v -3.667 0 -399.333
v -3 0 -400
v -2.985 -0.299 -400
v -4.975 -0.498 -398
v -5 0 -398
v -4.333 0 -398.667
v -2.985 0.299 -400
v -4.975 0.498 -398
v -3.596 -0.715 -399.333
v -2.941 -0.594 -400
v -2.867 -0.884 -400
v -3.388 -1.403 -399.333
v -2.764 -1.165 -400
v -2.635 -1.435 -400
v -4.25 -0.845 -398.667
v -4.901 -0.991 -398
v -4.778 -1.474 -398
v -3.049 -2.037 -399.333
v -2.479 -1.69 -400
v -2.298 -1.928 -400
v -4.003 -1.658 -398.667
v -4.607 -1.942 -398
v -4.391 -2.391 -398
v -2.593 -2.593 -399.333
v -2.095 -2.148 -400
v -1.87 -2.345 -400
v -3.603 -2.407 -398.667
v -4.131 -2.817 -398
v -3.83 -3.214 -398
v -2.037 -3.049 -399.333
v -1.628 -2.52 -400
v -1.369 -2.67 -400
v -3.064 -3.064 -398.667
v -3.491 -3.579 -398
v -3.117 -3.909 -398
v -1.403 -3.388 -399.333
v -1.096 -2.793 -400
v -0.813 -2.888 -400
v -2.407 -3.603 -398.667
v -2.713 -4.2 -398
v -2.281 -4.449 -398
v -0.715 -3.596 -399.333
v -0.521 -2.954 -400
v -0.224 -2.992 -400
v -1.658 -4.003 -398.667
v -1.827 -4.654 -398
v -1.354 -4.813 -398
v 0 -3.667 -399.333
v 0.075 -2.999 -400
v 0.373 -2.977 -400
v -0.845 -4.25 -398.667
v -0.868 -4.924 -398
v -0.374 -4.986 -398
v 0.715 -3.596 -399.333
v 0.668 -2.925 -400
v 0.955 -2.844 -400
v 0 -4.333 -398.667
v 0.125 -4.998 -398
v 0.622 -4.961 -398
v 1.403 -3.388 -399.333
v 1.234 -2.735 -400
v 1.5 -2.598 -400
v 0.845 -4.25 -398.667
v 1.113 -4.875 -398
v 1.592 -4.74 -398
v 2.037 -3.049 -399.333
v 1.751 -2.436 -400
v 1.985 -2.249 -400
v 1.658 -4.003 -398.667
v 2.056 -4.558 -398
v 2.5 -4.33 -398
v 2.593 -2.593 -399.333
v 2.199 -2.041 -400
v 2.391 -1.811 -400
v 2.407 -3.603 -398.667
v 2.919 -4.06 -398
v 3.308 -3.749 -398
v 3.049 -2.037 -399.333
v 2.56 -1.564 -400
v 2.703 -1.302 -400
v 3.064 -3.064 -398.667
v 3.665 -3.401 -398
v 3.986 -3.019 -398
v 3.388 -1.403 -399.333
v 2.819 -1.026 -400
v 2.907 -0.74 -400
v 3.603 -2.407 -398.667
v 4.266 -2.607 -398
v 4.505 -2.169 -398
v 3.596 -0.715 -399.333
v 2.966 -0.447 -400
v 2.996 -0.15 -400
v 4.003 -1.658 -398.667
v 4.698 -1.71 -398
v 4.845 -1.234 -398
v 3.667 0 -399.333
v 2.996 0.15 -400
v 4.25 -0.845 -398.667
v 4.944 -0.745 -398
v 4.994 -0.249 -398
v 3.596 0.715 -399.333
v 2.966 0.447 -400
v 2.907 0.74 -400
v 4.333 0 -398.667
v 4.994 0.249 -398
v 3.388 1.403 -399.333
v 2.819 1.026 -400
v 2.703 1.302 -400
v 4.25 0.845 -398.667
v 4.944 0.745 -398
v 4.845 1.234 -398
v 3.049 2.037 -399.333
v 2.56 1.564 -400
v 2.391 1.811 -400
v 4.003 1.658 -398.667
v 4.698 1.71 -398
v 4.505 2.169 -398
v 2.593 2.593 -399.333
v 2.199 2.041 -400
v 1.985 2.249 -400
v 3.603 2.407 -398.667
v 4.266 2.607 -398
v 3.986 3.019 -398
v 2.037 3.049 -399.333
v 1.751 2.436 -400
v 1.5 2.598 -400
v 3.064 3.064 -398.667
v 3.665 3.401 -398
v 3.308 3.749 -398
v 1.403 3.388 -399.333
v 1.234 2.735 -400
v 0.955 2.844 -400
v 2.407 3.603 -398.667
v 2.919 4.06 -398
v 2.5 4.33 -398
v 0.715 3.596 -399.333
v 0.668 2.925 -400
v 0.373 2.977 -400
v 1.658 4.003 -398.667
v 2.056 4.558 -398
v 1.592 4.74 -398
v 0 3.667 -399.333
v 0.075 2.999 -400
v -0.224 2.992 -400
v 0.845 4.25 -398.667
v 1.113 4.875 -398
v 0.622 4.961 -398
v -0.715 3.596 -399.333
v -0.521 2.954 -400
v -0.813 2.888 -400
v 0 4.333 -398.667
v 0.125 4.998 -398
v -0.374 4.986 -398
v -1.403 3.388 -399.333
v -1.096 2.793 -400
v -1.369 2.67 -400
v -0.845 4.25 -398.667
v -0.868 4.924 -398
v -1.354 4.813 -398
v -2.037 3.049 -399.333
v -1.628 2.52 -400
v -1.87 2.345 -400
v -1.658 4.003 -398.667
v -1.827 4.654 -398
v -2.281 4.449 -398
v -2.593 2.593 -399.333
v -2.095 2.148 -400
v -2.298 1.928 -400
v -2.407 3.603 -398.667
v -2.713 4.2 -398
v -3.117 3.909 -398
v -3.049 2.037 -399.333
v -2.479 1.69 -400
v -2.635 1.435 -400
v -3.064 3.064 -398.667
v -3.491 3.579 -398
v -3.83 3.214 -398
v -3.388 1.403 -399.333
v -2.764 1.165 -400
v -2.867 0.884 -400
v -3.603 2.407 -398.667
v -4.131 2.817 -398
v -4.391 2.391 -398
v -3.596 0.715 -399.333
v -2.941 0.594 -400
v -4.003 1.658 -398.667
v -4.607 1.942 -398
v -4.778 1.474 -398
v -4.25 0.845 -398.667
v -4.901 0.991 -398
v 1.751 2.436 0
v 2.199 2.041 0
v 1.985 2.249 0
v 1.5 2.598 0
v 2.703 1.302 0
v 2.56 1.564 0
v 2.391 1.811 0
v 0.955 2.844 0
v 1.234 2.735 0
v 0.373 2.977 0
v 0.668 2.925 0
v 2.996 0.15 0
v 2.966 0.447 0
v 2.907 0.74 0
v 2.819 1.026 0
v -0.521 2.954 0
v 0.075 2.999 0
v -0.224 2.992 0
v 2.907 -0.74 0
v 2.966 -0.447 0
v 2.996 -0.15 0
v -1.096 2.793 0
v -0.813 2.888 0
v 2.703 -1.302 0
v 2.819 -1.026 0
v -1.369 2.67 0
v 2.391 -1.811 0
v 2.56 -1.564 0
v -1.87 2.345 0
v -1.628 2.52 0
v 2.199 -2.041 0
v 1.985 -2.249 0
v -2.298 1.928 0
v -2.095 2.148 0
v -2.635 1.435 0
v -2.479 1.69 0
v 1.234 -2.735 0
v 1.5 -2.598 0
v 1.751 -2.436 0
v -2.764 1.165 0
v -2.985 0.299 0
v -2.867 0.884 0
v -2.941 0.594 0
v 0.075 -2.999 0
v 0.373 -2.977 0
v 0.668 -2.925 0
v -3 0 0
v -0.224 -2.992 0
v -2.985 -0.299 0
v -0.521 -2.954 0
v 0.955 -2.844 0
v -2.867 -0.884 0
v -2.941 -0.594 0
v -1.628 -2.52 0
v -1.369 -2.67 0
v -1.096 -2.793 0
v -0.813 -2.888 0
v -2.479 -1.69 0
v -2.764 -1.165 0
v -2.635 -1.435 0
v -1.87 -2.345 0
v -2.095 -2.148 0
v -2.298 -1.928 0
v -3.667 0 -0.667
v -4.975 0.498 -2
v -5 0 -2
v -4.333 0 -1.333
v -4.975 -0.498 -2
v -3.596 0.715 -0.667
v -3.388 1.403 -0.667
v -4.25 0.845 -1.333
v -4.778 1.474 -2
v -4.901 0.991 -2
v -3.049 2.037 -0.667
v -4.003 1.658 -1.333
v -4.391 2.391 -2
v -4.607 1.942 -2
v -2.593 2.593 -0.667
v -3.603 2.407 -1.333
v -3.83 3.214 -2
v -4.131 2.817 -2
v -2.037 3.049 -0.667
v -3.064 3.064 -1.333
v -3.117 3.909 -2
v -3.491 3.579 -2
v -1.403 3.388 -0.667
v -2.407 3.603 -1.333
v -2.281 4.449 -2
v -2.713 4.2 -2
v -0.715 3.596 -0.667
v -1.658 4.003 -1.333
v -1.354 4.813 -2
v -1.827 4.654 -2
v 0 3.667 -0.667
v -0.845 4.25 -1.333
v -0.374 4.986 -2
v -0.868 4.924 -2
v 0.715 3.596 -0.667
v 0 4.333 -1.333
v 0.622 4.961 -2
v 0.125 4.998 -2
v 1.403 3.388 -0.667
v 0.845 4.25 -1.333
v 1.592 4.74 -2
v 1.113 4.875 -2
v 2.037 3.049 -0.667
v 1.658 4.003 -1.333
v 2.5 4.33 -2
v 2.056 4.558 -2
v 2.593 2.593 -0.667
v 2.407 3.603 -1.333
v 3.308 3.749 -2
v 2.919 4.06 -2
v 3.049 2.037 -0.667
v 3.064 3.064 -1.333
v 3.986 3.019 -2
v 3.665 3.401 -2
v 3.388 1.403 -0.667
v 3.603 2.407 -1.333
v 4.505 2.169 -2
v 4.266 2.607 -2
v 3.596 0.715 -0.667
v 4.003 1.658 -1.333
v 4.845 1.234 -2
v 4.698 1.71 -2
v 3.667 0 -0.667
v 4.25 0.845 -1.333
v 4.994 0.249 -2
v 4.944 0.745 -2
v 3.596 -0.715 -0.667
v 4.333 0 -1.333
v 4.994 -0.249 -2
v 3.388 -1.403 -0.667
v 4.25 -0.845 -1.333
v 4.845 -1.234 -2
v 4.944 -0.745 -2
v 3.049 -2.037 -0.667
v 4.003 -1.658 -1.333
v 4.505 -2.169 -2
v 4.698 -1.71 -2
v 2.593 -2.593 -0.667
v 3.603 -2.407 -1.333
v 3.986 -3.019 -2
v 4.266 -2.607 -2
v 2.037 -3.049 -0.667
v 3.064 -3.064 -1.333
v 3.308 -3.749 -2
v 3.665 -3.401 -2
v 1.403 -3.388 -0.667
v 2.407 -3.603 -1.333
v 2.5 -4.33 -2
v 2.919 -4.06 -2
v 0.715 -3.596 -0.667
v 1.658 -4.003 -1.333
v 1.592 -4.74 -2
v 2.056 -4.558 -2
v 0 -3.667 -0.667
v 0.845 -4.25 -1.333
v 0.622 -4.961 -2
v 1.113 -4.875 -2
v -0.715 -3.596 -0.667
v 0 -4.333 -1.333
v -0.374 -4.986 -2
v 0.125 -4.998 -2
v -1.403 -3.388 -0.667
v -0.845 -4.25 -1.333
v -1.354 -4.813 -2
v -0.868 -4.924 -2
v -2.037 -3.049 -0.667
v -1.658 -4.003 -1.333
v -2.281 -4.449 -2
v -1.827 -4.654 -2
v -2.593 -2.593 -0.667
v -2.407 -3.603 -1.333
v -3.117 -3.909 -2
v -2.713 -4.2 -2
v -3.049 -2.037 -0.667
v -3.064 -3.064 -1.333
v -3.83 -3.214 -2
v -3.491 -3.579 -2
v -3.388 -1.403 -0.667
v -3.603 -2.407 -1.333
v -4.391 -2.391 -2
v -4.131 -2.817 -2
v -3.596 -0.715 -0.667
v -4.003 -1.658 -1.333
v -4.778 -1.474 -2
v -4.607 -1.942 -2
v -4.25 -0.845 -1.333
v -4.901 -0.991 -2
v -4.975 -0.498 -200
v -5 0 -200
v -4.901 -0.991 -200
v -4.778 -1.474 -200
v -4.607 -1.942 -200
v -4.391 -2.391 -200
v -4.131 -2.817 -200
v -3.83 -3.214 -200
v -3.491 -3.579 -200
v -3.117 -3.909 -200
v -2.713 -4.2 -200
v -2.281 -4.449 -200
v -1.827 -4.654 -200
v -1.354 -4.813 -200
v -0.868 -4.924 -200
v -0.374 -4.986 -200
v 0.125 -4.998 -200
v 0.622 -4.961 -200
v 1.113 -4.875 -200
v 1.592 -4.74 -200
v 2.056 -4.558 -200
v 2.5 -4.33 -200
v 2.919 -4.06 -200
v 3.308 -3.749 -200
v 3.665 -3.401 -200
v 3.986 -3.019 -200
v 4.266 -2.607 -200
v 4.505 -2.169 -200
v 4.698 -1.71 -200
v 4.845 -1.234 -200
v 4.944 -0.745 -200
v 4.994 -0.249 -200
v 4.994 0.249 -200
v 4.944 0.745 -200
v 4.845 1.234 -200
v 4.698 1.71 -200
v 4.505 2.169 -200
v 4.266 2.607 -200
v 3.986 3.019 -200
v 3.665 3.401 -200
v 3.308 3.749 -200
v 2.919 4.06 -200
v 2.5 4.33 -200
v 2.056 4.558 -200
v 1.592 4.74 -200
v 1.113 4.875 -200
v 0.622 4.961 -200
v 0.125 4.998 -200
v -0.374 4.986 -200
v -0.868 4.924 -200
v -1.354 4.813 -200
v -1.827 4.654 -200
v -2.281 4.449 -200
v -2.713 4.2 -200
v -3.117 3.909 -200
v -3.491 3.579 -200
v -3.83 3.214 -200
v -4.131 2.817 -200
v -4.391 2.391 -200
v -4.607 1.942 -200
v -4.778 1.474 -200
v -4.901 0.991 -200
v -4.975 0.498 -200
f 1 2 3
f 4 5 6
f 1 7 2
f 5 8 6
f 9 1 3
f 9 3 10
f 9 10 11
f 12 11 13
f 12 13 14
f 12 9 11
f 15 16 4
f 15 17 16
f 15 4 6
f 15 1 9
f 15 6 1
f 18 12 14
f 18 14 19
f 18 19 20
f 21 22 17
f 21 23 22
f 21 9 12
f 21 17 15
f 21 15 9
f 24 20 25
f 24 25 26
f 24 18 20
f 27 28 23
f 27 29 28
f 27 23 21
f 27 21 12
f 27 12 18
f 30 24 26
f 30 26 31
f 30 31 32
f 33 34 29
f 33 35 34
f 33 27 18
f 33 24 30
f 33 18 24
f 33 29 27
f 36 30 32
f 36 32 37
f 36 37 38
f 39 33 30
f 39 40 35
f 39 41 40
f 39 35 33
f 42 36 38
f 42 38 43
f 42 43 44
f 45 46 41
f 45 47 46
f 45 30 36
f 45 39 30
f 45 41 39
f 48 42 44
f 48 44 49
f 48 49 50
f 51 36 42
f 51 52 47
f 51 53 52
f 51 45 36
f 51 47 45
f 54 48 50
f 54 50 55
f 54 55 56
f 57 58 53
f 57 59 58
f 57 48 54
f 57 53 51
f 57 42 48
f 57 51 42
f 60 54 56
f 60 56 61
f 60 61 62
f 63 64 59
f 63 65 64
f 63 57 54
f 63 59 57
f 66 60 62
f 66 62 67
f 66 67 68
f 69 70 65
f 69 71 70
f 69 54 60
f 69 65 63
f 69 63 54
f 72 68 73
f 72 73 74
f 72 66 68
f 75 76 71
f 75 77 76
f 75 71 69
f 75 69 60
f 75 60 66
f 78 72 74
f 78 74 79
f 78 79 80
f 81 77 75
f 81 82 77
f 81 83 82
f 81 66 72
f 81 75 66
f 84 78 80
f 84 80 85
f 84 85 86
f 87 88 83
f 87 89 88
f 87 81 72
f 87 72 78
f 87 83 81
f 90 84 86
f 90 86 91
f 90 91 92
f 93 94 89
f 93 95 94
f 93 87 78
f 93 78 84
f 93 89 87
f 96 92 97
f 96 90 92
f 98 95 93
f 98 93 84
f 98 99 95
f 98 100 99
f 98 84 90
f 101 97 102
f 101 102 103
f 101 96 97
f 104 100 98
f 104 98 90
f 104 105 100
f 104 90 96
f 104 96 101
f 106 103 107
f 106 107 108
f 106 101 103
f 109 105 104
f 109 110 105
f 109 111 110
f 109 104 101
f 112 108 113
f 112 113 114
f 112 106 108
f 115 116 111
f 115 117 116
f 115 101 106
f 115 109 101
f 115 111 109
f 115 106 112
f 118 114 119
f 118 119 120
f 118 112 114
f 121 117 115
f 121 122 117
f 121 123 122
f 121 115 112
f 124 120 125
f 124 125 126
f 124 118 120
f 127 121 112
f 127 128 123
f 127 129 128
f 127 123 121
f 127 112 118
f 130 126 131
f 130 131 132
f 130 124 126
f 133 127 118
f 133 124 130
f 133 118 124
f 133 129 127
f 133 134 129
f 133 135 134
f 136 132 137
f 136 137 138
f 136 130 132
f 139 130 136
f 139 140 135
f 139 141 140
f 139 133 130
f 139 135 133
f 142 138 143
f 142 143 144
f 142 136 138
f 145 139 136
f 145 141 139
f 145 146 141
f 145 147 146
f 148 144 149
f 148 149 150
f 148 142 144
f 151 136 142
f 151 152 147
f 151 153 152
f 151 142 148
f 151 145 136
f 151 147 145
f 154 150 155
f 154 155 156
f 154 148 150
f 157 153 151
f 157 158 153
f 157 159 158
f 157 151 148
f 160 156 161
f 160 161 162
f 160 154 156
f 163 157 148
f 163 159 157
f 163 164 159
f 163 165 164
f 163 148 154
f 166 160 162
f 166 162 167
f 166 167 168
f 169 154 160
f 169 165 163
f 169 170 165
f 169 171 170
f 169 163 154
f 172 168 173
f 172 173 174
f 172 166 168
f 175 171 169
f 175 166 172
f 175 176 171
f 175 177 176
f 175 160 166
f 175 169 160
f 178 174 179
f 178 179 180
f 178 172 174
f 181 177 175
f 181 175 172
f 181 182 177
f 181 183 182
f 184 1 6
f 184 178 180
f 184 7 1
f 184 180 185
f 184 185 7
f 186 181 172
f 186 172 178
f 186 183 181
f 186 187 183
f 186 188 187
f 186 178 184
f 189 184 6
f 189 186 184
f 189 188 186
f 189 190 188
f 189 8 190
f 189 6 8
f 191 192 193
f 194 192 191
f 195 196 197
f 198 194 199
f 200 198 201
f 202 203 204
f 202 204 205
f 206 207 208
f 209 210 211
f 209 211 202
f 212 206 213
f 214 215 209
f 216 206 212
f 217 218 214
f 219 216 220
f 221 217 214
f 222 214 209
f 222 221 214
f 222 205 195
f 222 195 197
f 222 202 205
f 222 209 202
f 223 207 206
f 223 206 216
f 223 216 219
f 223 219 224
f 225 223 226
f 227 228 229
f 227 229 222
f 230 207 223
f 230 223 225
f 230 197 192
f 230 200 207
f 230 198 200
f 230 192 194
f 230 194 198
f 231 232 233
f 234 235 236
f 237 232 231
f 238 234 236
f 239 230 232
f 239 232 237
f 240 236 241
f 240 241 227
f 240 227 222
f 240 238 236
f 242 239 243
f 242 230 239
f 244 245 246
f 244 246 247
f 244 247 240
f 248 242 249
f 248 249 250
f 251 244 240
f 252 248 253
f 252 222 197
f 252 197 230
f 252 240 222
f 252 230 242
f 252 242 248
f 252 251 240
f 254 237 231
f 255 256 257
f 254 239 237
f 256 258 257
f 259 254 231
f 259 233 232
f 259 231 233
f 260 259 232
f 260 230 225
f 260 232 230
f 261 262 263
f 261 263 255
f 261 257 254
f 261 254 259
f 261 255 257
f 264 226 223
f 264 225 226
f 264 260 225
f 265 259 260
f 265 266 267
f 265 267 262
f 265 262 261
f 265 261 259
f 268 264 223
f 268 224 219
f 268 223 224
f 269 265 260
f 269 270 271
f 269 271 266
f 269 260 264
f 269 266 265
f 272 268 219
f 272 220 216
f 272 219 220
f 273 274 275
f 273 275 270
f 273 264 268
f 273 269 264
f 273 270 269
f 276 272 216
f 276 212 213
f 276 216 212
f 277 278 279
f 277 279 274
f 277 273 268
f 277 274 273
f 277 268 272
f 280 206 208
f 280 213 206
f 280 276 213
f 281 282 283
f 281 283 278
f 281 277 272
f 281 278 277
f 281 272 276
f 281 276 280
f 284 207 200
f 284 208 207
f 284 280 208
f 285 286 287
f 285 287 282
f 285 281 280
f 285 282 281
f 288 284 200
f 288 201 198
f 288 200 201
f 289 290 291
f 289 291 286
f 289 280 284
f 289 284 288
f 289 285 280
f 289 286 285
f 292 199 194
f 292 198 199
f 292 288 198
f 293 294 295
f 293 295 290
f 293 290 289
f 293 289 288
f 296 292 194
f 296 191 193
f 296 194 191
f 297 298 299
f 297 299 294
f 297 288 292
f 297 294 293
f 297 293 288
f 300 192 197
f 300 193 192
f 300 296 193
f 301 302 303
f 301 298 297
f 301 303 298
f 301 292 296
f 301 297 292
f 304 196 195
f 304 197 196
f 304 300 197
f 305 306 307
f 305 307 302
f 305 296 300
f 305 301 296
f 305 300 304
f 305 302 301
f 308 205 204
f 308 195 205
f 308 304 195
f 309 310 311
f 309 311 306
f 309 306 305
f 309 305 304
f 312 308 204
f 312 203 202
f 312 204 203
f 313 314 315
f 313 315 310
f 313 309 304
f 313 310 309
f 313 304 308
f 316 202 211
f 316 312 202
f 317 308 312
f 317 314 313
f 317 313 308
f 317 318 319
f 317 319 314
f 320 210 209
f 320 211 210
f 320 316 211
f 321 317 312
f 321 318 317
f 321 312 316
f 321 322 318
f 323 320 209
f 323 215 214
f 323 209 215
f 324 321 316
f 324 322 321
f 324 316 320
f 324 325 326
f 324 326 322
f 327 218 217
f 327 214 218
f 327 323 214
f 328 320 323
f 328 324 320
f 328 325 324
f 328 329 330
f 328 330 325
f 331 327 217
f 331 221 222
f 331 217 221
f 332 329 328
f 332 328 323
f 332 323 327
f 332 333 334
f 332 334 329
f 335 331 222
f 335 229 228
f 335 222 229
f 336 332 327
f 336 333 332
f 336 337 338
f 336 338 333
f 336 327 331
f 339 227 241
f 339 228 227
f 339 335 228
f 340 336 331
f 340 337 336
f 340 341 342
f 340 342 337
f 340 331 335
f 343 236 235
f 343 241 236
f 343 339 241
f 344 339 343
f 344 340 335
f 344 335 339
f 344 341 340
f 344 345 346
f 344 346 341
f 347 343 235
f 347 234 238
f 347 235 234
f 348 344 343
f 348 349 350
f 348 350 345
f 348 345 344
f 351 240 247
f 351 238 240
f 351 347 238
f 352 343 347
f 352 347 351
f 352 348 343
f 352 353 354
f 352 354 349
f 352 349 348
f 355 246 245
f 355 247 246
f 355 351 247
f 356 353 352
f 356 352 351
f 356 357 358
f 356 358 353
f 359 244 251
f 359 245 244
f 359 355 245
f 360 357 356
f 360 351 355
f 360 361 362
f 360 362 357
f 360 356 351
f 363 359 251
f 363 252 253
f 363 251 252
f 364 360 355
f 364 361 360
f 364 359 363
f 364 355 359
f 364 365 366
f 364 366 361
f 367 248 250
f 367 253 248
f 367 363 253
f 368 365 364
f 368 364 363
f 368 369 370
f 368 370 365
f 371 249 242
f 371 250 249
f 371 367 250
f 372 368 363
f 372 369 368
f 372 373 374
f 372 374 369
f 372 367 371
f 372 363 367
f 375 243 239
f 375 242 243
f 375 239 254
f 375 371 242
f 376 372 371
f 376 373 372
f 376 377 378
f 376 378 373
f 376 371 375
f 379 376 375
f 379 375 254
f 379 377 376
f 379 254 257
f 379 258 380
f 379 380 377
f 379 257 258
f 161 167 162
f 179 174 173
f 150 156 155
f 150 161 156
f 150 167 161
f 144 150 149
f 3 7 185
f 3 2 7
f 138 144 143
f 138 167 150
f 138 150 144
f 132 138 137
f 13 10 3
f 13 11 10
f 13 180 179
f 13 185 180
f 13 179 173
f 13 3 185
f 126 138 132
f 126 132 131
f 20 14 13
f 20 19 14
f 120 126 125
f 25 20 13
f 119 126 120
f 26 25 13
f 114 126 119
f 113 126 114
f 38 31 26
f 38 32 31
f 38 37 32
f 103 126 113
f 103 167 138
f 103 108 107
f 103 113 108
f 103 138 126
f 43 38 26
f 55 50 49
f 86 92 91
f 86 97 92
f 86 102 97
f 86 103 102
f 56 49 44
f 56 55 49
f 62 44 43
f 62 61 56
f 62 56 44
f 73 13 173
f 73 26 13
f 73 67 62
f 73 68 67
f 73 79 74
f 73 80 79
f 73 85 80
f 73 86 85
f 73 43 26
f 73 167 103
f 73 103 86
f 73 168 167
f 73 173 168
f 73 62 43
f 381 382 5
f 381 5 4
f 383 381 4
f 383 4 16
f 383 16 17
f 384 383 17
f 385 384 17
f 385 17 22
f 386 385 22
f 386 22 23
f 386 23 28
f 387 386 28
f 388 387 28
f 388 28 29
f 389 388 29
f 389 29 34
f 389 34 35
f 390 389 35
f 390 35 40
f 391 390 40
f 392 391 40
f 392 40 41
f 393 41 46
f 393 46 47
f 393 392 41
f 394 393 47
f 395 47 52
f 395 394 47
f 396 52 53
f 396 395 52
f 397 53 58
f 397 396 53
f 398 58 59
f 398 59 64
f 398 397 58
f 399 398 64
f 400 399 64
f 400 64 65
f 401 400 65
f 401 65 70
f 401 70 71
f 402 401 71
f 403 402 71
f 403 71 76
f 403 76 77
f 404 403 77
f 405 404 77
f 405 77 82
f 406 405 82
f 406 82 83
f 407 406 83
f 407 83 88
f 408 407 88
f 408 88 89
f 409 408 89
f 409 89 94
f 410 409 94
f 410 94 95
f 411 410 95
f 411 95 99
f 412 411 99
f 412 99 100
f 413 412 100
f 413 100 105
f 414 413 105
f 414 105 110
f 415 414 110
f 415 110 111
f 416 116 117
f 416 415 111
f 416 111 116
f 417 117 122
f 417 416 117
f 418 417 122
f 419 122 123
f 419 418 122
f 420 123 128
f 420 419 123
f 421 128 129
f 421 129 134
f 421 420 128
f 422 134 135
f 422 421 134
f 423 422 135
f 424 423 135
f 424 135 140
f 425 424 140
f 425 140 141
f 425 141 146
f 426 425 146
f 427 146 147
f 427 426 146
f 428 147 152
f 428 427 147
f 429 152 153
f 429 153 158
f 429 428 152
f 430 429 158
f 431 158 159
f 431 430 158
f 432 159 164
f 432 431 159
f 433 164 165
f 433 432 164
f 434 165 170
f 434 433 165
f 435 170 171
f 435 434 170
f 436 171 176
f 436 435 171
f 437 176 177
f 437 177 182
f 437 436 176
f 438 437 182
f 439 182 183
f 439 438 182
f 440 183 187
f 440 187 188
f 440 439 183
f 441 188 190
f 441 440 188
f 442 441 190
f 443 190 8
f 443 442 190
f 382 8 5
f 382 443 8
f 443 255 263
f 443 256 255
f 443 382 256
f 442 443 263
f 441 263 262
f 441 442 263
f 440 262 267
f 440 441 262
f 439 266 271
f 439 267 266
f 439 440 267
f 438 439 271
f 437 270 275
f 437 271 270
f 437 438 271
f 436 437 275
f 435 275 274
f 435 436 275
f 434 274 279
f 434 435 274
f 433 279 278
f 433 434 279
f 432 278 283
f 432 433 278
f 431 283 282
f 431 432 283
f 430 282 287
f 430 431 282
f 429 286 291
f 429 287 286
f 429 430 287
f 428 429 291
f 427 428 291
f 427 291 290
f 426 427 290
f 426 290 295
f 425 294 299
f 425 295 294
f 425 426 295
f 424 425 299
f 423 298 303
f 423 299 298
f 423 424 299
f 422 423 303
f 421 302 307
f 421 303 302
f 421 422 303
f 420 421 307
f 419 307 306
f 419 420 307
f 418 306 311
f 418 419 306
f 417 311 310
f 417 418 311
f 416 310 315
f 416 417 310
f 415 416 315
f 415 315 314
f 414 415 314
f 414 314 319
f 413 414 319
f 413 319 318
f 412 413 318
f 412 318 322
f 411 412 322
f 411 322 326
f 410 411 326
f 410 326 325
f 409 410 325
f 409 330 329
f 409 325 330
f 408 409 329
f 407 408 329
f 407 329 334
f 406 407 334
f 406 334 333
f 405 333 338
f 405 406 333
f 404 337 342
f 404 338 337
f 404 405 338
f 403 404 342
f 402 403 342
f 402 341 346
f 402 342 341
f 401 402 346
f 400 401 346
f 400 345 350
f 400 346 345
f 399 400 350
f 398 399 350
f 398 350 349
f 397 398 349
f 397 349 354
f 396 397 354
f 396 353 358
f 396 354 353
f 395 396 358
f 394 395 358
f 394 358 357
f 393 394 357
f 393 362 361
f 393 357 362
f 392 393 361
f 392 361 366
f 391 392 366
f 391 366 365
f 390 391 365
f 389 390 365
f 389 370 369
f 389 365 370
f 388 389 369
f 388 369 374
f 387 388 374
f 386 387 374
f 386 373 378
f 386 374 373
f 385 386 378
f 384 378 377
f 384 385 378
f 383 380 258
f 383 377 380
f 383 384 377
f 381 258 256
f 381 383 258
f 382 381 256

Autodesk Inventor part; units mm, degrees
ref_plane "YZ Plane" through (0, 0, 0) normal (1, 0, 0) x (0, 1, 0)
ref_plane "XZ Plane" through (0, 0, 0) normal (0, 1, 0) x (-1, 0, 0)
ref_plane "XY Plane" through (0, 0, 0) normal (0, 0, 1) x (1, 0, 0)
sketch "Skizze1" plane through (0, 0, 0) normal (0, 1, 0) x (-1, 0, 0)
  line L0 (0, 0) -> (5, 0)
  line L1 (5, 0) -> (5, -200)
  line L2 (5, -200) -> (0, -200)
  line L3 (0, -200) -> (0, 0)
  dimension "d0" = 200
  dimension "d1" = 10
revolve "Umdrehung1" add sketch "Skizze1" angle 360 about axis through (0, 0, -200) along (0, 0, 1)
thread "Gewinde1" size "M10x1.5" class "6g" standard "ISO Metric profile" length 15
chamfer "Fase1" distance 2 angle 45 1 edges at (5, 0, 0)
mirror "Spiegeln1" about plane through (0, 0, -200) normal (0, 0, -1)
properties part number "Gewindestange" material "Stahl AISI 4130"
